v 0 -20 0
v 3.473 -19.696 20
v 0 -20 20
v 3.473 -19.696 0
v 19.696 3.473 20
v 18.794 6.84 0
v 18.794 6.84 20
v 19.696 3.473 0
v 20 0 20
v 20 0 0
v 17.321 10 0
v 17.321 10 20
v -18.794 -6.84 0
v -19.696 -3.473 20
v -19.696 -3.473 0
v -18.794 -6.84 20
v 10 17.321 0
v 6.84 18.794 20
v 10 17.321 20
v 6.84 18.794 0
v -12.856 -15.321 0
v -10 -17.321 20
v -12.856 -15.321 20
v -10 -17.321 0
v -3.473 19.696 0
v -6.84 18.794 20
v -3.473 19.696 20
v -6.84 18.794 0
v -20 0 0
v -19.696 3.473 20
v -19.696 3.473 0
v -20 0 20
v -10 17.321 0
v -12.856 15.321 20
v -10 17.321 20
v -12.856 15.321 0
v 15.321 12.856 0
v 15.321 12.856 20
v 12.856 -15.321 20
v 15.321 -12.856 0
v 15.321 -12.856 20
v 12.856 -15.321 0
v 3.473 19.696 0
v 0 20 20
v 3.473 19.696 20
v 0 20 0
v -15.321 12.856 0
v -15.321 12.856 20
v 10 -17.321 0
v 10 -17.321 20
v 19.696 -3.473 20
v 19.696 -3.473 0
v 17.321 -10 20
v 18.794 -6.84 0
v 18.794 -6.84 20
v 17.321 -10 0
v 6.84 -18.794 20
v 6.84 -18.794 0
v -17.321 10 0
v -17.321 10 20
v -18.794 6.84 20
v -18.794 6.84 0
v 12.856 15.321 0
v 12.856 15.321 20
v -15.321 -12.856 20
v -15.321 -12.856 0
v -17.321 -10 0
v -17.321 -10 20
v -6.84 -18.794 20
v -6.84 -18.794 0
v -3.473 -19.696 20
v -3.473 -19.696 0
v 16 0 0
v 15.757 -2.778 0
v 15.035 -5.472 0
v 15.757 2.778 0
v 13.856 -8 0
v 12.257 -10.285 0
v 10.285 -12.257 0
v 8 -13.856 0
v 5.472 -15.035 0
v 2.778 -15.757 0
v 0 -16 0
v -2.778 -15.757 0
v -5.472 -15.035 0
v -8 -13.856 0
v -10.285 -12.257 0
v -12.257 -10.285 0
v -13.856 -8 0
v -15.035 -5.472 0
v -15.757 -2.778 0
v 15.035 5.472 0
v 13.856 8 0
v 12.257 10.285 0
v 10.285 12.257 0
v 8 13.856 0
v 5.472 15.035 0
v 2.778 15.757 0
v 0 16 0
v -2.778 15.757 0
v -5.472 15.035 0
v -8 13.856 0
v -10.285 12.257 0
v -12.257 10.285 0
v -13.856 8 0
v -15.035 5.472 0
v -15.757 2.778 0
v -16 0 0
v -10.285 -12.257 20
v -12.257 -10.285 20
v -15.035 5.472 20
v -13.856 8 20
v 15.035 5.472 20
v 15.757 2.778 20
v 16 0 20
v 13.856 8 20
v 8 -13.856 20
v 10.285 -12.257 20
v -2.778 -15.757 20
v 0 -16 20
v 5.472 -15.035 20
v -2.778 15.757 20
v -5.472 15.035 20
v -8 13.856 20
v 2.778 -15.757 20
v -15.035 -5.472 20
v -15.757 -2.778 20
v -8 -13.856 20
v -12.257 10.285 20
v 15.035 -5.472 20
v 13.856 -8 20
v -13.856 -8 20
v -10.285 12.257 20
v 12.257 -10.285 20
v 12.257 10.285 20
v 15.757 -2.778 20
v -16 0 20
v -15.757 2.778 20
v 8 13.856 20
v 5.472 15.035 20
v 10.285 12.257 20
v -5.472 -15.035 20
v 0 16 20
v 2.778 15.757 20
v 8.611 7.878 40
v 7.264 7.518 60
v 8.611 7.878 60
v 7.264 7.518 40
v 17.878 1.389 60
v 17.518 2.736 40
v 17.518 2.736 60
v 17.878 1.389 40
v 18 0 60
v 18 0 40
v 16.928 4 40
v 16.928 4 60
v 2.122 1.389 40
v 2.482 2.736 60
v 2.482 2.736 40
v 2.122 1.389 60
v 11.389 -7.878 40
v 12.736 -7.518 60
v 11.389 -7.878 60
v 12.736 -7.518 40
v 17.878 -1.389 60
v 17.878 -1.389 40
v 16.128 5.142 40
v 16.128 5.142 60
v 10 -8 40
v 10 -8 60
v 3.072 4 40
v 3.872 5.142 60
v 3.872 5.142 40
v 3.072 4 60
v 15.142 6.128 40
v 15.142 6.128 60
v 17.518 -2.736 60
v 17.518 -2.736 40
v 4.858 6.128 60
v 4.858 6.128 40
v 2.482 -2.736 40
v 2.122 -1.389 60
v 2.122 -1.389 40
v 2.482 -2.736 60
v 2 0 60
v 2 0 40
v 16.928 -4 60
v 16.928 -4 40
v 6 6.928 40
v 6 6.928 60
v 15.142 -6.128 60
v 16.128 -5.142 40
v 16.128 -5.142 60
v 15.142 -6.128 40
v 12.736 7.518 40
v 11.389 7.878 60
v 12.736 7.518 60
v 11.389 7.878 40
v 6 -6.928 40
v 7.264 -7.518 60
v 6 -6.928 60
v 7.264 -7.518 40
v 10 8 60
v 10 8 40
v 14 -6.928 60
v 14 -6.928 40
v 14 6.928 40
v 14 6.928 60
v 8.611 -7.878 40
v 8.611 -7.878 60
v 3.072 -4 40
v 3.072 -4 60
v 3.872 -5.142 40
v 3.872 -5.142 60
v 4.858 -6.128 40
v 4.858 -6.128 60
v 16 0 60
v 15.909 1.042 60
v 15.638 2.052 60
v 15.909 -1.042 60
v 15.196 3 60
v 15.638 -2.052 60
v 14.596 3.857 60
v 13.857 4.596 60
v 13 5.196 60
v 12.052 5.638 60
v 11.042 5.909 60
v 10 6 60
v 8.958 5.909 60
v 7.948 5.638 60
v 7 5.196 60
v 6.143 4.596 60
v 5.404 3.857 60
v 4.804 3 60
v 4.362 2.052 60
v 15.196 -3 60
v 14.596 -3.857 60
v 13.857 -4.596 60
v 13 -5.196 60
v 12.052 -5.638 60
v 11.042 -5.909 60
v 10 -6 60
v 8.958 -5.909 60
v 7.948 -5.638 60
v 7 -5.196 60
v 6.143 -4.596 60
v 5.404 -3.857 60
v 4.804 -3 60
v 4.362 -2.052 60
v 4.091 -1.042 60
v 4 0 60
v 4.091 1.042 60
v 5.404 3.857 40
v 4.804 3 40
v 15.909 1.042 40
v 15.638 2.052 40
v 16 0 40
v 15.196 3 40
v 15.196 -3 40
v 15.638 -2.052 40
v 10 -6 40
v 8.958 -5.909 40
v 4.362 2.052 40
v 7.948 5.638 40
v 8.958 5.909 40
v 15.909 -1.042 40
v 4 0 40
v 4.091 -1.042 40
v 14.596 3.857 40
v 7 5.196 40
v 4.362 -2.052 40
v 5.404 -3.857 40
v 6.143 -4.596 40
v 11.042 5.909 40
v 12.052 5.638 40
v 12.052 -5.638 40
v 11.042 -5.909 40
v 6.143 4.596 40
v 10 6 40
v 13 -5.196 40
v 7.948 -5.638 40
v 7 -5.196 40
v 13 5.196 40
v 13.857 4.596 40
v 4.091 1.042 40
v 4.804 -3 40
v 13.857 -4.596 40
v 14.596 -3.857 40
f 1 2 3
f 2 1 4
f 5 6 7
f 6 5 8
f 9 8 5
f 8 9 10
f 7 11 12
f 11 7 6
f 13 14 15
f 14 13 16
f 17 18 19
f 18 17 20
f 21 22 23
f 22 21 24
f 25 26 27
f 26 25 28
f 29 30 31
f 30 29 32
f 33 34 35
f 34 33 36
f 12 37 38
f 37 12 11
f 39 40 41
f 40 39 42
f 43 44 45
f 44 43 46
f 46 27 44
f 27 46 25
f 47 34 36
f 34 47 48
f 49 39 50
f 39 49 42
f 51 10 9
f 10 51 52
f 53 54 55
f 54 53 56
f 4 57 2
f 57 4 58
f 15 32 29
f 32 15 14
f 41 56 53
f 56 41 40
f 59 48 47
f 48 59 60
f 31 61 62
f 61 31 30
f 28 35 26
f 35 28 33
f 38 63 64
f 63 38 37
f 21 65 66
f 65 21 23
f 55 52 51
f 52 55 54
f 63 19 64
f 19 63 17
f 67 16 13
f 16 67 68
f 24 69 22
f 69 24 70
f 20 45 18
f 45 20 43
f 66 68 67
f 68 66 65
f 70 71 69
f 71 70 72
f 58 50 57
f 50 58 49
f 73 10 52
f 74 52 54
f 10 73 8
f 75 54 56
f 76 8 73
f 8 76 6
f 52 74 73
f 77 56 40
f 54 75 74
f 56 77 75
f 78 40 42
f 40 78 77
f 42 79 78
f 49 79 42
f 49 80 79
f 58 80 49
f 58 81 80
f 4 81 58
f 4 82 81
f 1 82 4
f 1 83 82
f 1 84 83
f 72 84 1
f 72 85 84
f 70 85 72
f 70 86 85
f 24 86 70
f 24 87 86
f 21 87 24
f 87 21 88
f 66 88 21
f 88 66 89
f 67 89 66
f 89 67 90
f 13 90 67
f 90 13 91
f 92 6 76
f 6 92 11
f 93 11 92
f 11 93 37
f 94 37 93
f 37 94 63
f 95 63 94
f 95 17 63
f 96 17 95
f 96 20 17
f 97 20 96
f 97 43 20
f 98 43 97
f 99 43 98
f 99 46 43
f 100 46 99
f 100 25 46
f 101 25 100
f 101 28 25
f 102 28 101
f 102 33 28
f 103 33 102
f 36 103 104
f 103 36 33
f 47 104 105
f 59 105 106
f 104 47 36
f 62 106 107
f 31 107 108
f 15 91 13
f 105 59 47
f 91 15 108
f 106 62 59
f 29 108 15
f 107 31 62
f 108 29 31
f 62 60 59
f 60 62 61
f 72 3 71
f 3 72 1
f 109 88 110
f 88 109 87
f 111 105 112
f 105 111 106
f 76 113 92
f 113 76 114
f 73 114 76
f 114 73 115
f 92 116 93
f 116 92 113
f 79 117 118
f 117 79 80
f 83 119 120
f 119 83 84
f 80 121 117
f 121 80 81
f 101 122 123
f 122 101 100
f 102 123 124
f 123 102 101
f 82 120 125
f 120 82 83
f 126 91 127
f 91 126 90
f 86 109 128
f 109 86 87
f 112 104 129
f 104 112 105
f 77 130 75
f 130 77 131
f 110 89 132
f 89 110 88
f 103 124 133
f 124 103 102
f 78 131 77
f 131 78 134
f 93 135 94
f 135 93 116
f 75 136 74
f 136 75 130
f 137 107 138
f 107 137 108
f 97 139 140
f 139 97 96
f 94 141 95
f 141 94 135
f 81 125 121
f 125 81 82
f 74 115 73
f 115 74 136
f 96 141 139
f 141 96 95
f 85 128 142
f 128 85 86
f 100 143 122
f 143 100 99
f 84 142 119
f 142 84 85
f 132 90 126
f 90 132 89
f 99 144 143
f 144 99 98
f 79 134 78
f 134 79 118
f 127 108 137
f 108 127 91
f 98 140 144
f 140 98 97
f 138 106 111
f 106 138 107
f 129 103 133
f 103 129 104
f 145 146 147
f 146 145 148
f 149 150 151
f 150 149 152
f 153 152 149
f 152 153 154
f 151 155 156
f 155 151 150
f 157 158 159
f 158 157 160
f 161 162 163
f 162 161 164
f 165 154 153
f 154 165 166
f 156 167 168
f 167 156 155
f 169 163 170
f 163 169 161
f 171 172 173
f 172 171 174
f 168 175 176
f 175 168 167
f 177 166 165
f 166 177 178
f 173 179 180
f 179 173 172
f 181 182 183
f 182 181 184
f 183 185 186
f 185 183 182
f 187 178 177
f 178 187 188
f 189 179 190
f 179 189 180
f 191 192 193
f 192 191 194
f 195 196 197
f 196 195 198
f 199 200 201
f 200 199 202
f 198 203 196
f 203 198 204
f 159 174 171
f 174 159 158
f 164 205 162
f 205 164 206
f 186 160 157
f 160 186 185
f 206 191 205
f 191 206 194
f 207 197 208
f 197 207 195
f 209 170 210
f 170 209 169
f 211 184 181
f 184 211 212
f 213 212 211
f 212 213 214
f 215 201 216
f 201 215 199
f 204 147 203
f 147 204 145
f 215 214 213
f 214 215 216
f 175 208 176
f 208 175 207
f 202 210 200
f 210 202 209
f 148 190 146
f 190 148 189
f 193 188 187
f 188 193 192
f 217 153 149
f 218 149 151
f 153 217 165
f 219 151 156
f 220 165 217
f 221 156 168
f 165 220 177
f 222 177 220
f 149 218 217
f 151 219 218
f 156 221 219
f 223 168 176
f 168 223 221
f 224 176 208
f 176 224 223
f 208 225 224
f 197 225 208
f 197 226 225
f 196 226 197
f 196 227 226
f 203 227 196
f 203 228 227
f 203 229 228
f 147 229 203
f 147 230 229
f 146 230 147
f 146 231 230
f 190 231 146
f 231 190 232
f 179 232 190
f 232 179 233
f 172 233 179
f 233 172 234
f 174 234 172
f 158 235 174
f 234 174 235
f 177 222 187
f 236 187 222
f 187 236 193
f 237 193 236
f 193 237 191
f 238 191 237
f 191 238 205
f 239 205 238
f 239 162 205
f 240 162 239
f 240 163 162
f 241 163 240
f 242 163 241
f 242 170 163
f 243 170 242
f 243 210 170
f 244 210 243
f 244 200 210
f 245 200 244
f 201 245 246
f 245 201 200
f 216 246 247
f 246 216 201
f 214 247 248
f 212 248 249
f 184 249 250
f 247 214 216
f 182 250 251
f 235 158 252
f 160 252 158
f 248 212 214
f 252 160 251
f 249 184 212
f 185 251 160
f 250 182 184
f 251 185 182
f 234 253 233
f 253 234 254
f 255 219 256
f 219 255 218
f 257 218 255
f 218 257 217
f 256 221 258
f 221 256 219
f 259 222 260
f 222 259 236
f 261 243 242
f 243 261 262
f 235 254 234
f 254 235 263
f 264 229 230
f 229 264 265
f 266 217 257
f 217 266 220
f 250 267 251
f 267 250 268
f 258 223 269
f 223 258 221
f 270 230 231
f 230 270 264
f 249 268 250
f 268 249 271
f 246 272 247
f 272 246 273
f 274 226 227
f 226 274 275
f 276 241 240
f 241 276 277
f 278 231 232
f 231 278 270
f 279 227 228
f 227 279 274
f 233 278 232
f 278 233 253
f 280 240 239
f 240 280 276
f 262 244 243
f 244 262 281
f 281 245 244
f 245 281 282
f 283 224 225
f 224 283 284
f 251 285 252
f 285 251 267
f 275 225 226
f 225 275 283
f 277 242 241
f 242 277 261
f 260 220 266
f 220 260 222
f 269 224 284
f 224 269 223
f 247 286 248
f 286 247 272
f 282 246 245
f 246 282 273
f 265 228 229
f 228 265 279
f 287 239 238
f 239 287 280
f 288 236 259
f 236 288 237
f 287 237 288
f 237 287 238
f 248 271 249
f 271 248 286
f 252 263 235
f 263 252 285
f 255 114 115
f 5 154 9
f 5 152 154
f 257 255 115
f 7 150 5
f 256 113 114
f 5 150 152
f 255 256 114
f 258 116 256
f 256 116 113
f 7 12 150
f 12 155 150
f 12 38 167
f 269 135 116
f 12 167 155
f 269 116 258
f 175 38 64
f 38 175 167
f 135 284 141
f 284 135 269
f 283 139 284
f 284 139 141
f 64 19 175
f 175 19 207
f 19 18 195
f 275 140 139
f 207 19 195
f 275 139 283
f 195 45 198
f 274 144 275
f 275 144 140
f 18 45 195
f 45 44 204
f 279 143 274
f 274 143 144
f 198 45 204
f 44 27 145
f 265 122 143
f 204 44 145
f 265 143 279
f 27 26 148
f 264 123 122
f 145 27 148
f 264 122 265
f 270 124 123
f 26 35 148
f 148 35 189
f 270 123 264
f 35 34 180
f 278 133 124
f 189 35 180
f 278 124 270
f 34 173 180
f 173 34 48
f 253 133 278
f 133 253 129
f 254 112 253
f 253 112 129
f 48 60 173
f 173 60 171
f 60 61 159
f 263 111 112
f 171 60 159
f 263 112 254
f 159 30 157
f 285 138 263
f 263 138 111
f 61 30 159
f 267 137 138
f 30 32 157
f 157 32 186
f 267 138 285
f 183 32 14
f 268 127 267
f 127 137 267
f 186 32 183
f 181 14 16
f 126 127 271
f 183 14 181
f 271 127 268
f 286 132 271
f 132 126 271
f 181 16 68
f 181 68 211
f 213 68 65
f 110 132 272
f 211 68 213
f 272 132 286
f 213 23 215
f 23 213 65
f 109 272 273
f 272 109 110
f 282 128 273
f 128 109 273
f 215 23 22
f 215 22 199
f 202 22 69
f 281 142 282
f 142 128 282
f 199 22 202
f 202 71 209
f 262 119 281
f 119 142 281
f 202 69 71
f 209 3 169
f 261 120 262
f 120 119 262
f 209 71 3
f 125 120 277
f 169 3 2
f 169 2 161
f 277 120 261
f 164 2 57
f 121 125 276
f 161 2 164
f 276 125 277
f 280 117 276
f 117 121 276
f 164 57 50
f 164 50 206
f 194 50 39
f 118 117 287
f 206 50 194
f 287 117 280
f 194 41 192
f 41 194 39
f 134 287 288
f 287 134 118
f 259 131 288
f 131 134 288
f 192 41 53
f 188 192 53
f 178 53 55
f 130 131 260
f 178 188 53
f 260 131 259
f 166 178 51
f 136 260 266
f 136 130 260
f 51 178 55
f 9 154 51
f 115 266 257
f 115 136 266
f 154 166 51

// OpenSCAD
// eccentric pipe reducer
// by MisterC

// input parameters

/* lower pipe */
// lower pipe inner diameter
lower_diameter = 32; // min/max:[1:100]
// lower pipe height
lower_height = 20; // min/max:[1:100]
// lower pipe wall
lower_wall = 4; // min/max:[0.5:0.5:10]

/* transition piece */
// gap between lower and upper pipes
trans_height = 20; // min/max:[5:50]

// offset of reducer:
trans_angle = 0; // min/max:[0:360]
// angle (0=+X,90=+Y etc)
// ratio to cl
trans_ratio = 100; // min/max:[0:100]
// 0 ratio is concentric
// 100 ratio is wall parallel

// should inside walls run through?
in_parallel = true; // [true,false]
// true if inner wall would be parallel, false if outer

// resolution of reducer
segments = 36; //[36:Low, 90:Medium, 180:High]


/* upper pipe */
// upper pipe inner diameter
upper_diameter = 12; // min/max:[1:100]
// upper pipe height
upper_height = 20; // min/max:[1:100]
// upper pipe wall
upper_wall = 2; // min/max:[0.5:0.5:10]


// calculated values
/* [Hidden]*/
ang = 360 / segments; // degrees per segment
$fn = segments; // make the pipes as accurate as the transition
fudge = 1; // fudge for cuts

// heights
lower_btm = 0;
lower_top = lower_btm + lower_height;
upper_btm = lower_top + trans_height;
upper_top = upper_btm + upper_height;

// pipe radii
lower_in = lower_diameter / 2;
lower_out = lower_in + lower_wall;
upper_in = upper_diameter / 2;
upper_out = upper_in + upper_wall;

// if parallel_check is inners (in_parallel is true) then centre_offset is inners else outers
// using SCAD's conditional syntax
ctr_off = in_parallel
    ? (lower_in - upper_in)
    : (lower_out - upper_out);

// now work out where the upper pipe centre is
x_offset = cos(trans_angle) * ctr_off * trans_ratio / 100;
y_offset = sin(trans_angle) * ctr_off * trans_ratio / 100;


// modules and functions
// cos_fill & sin_fill create a list of x&y co-ordinates using a loop structure copied from Mathgrrl's snowflakerator sequence generators
function cos_fill(distance, switch)
    = [for(step=[0:segments])
        distance*cos(ang*step) + x_offset*switch];

function sin_fill(distance, switch)
    = [for(step=[0:segments])
        distance*sin(ang*step) + y_offset*switch];

// lots of co-ordinate calcs
lower_Ox=cos_fill(lower_out,0);
lower_Oy=sin_fill(lower_out,0);

upper_Ox=cos_fill(upper_out,1);
upper_Oy=sin_fill(upper_out,1);

lower_Ix=cos_fill(lower_in,0);
lower_Iy=sin_fill(lower_in,0);

upper_Ix=cos_fill(upper_in,1);
upper_Iy=sin_fill(upper_in,1);

// and now to business
color ("green")
difference()    // lower pipe
{
    translate([0,0,lower_btm])
        cylinder(r=lower_out, h=lower_height);
    translate([0,0,lower_btm-fudge])
        cylinder(r=lower_in, h=lower_height+(2*fudge));
}
color ("red")
difference()    // upper pipe
{
    translate([x_offset,y_offset,upper_btm])
        cylinder(r=upper_out, h=upper_height);
    translate([x_offset,y_offset,upper_btm-fudge])
        cylinder(r=upper_in, h=upper_height+(2*fudge));
}
// 'cubes' (really trapezoidal blocks) for reducer using polyhedron command as per OpenSCAD wiki example 1 by Bruno Bronosky
color ("blue")
for (step=[1:segments])
{
    polyhedron(points = [
        [lower_Ox[step-1],lower_Oy[step-1],lower_top],
        [lower_Ox[step],lower_Oy[step],lower_top],
        [lower_Ix[step],lower_Iy[step],lower_top],
        [lower_Ix[step-1],lower_Iy[step-1],lower_top],
        [upper_Ox[step-1],upper_Oy[step-1],upper_btm],
        [upper_Ox[step],upper_Oy[step],upper_btm],
        [upper_Ix[step],upper_Iy[step],upper_btm],
        [upper_Ix[step-1],upper_Iy[step-1],upper_btm]
        ], faces = [
        [0,1,2,3],[4,5,1,0],[7,6,5,4],
        [5,6,2,1],[6,7,3,2],[7,4,0,3]]);
}
